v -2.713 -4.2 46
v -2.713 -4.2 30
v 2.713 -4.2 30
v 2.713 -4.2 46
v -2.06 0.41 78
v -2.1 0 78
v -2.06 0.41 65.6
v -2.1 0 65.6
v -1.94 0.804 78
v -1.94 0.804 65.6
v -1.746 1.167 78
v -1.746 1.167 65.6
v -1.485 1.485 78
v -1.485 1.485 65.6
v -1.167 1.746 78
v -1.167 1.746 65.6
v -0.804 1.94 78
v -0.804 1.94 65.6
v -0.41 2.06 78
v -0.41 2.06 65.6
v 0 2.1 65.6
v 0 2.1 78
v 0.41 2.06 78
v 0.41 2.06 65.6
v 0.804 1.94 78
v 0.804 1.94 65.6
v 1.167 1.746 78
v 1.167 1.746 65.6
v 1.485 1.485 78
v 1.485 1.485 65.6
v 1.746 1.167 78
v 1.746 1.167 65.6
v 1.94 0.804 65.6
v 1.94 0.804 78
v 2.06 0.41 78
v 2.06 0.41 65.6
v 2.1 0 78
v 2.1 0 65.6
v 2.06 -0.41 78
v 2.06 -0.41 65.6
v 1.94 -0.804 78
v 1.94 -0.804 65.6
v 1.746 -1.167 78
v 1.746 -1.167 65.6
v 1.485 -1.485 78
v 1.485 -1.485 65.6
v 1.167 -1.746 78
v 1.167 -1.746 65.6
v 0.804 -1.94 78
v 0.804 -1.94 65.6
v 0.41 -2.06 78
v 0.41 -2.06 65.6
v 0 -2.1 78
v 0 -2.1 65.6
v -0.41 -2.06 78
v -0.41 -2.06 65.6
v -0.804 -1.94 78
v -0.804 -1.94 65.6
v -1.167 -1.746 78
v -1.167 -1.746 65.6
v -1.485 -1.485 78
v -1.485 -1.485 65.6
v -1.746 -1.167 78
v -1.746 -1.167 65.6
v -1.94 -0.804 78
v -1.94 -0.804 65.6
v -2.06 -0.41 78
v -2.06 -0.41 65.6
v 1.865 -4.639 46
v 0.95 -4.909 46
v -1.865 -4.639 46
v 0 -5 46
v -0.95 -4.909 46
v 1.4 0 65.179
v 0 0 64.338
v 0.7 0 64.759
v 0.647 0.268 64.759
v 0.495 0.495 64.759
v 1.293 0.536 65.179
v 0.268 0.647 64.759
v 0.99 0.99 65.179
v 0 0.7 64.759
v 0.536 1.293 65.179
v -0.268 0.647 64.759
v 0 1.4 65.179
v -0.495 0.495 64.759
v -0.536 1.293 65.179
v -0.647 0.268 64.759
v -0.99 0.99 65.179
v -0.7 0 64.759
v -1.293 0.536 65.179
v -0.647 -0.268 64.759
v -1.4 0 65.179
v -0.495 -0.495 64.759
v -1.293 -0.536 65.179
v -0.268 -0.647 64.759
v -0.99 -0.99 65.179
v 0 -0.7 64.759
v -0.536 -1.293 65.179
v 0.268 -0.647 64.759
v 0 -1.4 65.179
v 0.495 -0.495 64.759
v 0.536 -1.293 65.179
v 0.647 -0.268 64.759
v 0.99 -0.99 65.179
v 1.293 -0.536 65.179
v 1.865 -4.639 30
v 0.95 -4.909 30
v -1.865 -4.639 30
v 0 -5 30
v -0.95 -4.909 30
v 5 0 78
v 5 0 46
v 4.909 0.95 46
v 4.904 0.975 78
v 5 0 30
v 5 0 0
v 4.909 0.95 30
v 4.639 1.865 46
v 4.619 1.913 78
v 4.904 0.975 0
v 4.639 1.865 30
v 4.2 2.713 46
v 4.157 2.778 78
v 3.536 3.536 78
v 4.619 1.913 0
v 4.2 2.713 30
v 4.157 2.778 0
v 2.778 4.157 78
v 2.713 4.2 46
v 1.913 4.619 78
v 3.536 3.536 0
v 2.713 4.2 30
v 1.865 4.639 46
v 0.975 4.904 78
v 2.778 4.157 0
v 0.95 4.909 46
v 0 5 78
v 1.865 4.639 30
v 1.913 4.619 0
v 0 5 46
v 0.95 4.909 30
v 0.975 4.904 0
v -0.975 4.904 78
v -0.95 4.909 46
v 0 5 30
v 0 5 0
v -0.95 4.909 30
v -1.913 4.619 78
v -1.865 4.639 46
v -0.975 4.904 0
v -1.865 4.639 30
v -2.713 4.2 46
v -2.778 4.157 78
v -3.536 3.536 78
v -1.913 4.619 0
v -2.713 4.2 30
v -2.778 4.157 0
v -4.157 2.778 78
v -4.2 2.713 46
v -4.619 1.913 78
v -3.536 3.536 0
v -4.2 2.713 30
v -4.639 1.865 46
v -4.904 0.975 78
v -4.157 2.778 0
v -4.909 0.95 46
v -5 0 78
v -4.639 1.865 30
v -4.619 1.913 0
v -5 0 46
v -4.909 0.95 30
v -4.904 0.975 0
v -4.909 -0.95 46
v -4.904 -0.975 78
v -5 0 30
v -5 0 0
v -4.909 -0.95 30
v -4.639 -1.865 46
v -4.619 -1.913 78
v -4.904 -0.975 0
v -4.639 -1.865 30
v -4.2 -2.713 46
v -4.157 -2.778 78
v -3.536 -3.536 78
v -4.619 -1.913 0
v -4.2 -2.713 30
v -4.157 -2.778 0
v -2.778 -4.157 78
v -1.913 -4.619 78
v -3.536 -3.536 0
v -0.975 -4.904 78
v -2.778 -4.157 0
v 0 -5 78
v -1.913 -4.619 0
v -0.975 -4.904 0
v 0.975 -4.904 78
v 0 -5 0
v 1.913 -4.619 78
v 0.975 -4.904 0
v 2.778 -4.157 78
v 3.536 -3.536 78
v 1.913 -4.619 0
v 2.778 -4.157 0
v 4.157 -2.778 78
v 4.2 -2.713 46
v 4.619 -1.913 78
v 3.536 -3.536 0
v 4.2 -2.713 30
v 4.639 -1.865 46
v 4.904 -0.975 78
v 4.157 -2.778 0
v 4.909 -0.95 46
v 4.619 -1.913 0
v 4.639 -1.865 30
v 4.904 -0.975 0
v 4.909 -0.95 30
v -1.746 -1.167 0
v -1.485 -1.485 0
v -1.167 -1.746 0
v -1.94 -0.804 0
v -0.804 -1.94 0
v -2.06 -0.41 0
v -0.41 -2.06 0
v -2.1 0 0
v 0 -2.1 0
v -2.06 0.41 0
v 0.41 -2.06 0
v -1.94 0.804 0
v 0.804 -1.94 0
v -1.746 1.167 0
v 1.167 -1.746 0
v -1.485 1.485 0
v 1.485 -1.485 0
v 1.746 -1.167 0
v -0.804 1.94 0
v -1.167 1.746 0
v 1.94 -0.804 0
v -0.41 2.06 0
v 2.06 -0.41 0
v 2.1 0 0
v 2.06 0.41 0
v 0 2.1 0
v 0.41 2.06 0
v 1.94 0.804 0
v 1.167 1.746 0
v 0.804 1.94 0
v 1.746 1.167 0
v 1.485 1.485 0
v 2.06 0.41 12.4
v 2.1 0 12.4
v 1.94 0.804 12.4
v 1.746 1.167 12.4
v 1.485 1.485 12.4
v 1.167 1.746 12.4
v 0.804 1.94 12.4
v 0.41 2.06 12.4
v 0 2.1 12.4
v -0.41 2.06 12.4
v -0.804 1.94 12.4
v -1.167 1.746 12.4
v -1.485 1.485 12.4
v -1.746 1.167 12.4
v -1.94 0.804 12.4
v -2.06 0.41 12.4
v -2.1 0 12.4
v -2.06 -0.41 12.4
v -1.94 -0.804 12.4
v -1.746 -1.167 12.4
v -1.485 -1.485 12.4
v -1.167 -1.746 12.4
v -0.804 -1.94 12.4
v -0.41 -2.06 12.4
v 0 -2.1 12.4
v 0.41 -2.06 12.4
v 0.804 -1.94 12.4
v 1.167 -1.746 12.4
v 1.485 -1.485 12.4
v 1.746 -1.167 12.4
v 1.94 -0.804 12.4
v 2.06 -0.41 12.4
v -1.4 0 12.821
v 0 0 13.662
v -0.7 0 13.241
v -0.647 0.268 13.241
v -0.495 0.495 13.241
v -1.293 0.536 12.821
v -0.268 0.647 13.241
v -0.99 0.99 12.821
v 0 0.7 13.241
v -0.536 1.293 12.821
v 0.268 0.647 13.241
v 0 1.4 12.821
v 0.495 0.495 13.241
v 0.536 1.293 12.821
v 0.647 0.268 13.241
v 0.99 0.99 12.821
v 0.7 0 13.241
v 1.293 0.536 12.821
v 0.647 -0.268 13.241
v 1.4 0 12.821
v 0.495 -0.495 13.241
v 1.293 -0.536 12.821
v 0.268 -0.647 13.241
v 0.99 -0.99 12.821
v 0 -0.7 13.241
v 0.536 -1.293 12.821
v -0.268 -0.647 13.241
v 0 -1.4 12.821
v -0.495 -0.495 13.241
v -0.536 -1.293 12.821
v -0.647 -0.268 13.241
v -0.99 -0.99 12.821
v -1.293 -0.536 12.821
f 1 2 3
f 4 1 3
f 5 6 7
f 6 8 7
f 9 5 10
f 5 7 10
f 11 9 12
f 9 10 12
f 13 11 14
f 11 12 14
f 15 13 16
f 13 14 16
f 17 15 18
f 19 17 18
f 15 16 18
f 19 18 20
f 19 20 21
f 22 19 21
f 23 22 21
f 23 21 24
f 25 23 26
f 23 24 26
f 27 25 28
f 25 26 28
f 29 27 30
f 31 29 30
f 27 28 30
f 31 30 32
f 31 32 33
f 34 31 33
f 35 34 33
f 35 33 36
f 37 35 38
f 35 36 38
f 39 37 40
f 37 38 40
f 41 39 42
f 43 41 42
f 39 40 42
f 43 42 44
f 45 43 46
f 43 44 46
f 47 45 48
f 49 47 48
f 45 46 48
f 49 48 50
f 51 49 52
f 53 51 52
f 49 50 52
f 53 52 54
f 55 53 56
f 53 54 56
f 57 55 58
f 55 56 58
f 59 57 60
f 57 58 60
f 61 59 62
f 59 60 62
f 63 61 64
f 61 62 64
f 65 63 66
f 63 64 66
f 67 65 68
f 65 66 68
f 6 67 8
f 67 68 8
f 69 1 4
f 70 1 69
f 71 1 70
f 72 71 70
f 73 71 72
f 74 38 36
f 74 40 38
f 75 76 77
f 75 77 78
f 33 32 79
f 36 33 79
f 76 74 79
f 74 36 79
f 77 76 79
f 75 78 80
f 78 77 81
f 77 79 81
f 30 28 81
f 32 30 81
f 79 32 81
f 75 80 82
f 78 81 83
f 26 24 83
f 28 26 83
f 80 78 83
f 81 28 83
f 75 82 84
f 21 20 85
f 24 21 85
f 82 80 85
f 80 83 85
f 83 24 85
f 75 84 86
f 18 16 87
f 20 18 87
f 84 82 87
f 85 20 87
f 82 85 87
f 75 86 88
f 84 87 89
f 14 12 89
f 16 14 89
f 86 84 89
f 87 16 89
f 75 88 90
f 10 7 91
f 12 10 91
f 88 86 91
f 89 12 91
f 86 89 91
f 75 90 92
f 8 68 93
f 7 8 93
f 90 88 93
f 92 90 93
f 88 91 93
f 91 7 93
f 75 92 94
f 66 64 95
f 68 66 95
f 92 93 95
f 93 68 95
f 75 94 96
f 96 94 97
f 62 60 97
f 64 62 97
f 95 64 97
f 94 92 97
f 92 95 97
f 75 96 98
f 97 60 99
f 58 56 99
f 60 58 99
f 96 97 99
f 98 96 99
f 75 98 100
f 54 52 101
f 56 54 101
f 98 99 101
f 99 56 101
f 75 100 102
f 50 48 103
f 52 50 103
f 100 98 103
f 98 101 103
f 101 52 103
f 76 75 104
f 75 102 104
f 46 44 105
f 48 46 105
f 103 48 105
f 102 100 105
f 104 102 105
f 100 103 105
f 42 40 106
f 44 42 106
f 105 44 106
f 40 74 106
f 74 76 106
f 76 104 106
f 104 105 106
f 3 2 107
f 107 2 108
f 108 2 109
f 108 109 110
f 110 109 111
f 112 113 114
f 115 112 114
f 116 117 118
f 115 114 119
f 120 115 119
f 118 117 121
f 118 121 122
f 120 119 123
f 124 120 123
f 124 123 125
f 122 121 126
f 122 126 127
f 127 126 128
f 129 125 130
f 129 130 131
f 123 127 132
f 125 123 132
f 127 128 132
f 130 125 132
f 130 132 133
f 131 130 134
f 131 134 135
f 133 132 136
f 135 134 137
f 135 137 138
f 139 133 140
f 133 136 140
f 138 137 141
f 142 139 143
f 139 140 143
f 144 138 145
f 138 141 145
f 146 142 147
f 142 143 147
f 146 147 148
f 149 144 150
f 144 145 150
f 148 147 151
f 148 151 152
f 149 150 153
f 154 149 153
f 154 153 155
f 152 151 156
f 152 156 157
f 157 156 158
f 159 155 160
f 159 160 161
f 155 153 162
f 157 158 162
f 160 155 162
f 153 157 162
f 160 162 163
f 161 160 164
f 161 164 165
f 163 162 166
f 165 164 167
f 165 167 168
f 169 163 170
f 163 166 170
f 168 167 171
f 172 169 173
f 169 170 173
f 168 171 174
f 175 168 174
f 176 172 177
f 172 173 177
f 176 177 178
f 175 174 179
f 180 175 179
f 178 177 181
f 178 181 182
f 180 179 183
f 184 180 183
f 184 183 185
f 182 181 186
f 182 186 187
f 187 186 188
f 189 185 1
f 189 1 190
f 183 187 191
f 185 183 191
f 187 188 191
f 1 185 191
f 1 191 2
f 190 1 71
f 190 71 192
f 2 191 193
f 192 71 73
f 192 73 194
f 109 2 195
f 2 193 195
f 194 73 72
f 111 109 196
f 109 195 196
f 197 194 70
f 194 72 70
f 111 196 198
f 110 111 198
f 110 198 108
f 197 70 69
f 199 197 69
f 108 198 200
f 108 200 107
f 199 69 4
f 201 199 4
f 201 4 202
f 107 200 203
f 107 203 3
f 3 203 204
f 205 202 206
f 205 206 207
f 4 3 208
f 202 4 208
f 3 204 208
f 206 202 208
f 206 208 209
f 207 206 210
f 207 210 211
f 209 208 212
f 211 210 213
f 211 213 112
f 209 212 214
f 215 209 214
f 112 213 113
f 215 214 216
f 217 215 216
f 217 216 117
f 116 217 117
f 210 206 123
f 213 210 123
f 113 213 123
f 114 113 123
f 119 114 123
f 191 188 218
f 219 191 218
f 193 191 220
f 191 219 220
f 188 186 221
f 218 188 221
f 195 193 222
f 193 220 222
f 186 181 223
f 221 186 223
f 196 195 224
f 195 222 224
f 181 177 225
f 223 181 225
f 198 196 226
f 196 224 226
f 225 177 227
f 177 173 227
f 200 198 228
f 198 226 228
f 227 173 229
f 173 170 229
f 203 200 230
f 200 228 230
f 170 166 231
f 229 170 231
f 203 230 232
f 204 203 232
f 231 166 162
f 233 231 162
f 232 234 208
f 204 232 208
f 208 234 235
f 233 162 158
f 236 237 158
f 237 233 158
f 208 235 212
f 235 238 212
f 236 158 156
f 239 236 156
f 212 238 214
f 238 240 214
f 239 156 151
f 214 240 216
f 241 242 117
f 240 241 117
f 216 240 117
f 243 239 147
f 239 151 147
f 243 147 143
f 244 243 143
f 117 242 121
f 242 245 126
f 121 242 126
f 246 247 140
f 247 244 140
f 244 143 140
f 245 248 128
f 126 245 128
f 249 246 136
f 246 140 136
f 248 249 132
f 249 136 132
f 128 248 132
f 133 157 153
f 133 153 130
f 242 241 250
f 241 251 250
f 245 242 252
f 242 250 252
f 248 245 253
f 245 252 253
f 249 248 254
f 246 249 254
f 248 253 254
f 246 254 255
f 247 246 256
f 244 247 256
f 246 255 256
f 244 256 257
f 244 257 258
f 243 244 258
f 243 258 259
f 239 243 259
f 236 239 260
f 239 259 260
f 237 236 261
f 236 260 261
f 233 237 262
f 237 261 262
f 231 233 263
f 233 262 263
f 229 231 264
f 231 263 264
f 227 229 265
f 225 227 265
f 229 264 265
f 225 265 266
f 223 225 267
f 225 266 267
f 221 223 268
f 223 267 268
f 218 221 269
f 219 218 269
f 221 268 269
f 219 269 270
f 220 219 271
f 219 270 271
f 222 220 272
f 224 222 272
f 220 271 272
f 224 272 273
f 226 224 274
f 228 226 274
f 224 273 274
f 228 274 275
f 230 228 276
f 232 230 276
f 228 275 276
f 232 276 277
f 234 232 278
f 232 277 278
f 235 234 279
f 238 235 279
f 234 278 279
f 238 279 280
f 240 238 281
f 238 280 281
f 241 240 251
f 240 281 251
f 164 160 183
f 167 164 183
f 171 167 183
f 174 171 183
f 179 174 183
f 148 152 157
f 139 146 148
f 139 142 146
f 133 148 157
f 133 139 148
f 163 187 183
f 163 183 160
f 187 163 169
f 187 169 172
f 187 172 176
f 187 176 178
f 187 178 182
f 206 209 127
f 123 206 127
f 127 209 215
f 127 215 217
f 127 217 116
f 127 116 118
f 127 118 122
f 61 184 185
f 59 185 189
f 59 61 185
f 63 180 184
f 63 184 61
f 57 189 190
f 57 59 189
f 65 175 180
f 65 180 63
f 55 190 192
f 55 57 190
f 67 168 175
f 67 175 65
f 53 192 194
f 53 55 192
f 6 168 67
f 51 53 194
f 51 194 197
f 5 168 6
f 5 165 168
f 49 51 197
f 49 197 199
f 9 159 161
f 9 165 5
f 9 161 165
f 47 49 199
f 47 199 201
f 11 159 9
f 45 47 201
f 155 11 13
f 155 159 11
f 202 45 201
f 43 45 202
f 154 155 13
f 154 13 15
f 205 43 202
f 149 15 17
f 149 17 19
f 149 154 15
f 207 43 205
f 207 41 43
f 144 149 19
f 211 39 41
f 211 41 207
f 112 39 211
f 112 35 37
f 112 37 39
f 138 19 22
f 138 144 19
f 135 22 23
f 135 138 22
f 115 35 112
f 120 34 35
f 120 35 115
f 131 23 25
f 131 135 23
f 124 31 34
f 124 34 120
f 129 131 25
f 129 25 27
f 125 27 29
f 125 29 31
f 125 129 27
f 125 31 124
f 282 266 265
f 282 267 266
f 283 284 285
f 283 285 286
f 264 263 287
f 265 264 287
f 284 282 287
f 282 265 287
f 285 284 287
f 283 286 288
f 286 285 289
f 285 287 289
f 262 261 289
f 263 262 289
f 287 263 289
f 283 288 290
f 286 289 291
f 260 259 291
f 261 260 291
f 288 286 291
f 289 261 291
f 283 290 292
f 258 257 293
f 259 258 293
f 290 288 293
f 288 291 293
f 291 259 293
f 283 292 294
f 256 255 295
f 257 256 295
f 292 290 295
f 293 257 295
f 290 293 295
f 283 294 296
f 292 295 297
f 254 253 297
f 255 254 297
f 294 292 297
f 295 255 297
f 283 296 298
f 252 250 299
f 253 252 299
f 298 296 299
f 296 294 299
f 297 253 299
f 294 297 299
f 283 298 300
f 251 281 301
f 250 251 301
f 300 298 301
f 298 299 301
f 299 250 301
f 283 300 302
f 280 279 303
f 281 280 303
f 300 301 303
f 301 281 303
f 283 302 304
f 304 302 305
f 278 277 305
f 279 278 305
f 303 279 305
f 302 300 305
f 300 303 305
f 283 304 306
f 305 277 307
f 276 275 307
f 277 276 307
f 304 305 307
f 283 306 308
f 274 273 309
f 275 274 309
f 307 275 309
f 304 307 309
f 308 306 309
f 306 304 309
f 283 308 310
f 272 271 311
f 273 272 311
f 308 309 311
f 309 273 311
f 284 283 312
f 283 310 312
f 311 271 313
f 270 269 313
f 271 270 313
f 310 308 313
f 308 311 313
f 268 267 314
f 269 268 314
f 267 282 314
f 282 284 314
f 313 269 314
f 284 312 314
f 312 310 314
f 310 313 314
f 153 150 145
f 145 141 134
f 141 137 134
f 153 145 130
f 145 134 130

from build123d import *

# Parameters (mm, degrees)
SKETCH_1_R               = 5
EXTRUDE_1_DEPTH          = 78
HOLE_WIZARD_M5_1_D       = 4.2
HOLE_WIZARD_M5_1_DEPTH   = 12.4
HOLE_WIZARD_M5_1_TIP     = 1.2618073
HOLE_WIZARD_M5_2_D       = 4.2
HOLE_WIZARD_M5_2_DEPTH   = 12.4
HOLE_WIZARD_M5_2_TIP     = 1.2618073
CUT_EXTRUDE_1_DEPTH      = 8
CUT_EXTRUDE_1_DEPTH_BACK = 8
SKETCH_6_W               = 7.505950336
SKETCH_6_H               = 7.971260953
SKETCH_6_W_2             = 6.842029893
SKETCH_6_H_2             = 4.427384225
SKETCH_6_W_3             = 6.476020113
SKETCH_6_H_3             = 7.384230107
SKETCH_6_W_4             = 6.951681063
SKETCH_6_H_4             = 4.627406651


with BuildPart() as part:
    # 草图1 → 凸台-拉伸1 (new body)
    with BuildSketch(Plane.XY):
        Circle(SKETCH_1_R)
    extrude(amount=EXTRUDE_1_DEPTH)

    # M5 螺纹孔1
    with Locations(Plane.XY.offset(78)):
        with Locations((0, 0)):
            Hole(HOLE_WIZARD_M5_1_D / 2, depth=HOLE_WIZARD_M5_1_DEPTH)
            with Locations((0, 0, -(HOLE_WIZARD_M5_1_DEPTH + HOLE_WIZARD_M5_1_TIP / 2))):  # 118° drill point
                Cone(0, HOLE_WIZARD_M5_1_D / 2, HOLE_WIZARD_M5_1_TIP, mode=Mode.SUBTRACT)

    # M5 螺纹孔2
    with Locations(Plane(origin=(0, 0, 0), x_dir=(-1, 0, 0), z_dir=(0, 0, -1))):
        with Locations((0, 0)):
            Hole(HOLE_WIZARD_M5_2_D / 2, depth=HOLE_WIZARD_M5_2_DEPTH)
            with Locations((0, 0, -(HOLE_WIZARD_M5_2_DEPTH + HOLE_WIZARD_M5_2_TIP / 2))):  # 118° drill point
                Cone(0, HOLE_WIZARD_M5_2_D / 2, HOLE_WIZARD_M5_2_TIP, mode=Mode.SUBTRACT)

    # 草图6 → 切除-拉伸1 (cut, two sides: drawn at the far end of the back side and taken through both)
    with BuildSketch(Plane.XY.offset(38).offset(-CUT_EXTRUDE_1_DEPTH_BACK)):
        with Locations((-7.952975168, -0.439871177)):
            Rectangle(SKETCH_6_W, SKETCH_6_H)
        with Locations((0.010635023, 6.413692112)):
            Rectangle(SKETCH_6_W_2, SKETCH_6_H_2)
        with Locations((7.438010056, -0.146355753)):
            Rectangle(SKETCH_6_W_3, SKETCH_6_H_3)
        with Locations((-0.075086924, -6.513703325)):
            Rectangle(SKETCH_6_W_4, SKETCH_6_H_4)
    extrude(amount=CUT_EXTRUDE_1_DEPTH + CUT_EXTRUDE_1_DEPTH_BACK, mode=Mode.SUBTRACT)


solid = part.part
